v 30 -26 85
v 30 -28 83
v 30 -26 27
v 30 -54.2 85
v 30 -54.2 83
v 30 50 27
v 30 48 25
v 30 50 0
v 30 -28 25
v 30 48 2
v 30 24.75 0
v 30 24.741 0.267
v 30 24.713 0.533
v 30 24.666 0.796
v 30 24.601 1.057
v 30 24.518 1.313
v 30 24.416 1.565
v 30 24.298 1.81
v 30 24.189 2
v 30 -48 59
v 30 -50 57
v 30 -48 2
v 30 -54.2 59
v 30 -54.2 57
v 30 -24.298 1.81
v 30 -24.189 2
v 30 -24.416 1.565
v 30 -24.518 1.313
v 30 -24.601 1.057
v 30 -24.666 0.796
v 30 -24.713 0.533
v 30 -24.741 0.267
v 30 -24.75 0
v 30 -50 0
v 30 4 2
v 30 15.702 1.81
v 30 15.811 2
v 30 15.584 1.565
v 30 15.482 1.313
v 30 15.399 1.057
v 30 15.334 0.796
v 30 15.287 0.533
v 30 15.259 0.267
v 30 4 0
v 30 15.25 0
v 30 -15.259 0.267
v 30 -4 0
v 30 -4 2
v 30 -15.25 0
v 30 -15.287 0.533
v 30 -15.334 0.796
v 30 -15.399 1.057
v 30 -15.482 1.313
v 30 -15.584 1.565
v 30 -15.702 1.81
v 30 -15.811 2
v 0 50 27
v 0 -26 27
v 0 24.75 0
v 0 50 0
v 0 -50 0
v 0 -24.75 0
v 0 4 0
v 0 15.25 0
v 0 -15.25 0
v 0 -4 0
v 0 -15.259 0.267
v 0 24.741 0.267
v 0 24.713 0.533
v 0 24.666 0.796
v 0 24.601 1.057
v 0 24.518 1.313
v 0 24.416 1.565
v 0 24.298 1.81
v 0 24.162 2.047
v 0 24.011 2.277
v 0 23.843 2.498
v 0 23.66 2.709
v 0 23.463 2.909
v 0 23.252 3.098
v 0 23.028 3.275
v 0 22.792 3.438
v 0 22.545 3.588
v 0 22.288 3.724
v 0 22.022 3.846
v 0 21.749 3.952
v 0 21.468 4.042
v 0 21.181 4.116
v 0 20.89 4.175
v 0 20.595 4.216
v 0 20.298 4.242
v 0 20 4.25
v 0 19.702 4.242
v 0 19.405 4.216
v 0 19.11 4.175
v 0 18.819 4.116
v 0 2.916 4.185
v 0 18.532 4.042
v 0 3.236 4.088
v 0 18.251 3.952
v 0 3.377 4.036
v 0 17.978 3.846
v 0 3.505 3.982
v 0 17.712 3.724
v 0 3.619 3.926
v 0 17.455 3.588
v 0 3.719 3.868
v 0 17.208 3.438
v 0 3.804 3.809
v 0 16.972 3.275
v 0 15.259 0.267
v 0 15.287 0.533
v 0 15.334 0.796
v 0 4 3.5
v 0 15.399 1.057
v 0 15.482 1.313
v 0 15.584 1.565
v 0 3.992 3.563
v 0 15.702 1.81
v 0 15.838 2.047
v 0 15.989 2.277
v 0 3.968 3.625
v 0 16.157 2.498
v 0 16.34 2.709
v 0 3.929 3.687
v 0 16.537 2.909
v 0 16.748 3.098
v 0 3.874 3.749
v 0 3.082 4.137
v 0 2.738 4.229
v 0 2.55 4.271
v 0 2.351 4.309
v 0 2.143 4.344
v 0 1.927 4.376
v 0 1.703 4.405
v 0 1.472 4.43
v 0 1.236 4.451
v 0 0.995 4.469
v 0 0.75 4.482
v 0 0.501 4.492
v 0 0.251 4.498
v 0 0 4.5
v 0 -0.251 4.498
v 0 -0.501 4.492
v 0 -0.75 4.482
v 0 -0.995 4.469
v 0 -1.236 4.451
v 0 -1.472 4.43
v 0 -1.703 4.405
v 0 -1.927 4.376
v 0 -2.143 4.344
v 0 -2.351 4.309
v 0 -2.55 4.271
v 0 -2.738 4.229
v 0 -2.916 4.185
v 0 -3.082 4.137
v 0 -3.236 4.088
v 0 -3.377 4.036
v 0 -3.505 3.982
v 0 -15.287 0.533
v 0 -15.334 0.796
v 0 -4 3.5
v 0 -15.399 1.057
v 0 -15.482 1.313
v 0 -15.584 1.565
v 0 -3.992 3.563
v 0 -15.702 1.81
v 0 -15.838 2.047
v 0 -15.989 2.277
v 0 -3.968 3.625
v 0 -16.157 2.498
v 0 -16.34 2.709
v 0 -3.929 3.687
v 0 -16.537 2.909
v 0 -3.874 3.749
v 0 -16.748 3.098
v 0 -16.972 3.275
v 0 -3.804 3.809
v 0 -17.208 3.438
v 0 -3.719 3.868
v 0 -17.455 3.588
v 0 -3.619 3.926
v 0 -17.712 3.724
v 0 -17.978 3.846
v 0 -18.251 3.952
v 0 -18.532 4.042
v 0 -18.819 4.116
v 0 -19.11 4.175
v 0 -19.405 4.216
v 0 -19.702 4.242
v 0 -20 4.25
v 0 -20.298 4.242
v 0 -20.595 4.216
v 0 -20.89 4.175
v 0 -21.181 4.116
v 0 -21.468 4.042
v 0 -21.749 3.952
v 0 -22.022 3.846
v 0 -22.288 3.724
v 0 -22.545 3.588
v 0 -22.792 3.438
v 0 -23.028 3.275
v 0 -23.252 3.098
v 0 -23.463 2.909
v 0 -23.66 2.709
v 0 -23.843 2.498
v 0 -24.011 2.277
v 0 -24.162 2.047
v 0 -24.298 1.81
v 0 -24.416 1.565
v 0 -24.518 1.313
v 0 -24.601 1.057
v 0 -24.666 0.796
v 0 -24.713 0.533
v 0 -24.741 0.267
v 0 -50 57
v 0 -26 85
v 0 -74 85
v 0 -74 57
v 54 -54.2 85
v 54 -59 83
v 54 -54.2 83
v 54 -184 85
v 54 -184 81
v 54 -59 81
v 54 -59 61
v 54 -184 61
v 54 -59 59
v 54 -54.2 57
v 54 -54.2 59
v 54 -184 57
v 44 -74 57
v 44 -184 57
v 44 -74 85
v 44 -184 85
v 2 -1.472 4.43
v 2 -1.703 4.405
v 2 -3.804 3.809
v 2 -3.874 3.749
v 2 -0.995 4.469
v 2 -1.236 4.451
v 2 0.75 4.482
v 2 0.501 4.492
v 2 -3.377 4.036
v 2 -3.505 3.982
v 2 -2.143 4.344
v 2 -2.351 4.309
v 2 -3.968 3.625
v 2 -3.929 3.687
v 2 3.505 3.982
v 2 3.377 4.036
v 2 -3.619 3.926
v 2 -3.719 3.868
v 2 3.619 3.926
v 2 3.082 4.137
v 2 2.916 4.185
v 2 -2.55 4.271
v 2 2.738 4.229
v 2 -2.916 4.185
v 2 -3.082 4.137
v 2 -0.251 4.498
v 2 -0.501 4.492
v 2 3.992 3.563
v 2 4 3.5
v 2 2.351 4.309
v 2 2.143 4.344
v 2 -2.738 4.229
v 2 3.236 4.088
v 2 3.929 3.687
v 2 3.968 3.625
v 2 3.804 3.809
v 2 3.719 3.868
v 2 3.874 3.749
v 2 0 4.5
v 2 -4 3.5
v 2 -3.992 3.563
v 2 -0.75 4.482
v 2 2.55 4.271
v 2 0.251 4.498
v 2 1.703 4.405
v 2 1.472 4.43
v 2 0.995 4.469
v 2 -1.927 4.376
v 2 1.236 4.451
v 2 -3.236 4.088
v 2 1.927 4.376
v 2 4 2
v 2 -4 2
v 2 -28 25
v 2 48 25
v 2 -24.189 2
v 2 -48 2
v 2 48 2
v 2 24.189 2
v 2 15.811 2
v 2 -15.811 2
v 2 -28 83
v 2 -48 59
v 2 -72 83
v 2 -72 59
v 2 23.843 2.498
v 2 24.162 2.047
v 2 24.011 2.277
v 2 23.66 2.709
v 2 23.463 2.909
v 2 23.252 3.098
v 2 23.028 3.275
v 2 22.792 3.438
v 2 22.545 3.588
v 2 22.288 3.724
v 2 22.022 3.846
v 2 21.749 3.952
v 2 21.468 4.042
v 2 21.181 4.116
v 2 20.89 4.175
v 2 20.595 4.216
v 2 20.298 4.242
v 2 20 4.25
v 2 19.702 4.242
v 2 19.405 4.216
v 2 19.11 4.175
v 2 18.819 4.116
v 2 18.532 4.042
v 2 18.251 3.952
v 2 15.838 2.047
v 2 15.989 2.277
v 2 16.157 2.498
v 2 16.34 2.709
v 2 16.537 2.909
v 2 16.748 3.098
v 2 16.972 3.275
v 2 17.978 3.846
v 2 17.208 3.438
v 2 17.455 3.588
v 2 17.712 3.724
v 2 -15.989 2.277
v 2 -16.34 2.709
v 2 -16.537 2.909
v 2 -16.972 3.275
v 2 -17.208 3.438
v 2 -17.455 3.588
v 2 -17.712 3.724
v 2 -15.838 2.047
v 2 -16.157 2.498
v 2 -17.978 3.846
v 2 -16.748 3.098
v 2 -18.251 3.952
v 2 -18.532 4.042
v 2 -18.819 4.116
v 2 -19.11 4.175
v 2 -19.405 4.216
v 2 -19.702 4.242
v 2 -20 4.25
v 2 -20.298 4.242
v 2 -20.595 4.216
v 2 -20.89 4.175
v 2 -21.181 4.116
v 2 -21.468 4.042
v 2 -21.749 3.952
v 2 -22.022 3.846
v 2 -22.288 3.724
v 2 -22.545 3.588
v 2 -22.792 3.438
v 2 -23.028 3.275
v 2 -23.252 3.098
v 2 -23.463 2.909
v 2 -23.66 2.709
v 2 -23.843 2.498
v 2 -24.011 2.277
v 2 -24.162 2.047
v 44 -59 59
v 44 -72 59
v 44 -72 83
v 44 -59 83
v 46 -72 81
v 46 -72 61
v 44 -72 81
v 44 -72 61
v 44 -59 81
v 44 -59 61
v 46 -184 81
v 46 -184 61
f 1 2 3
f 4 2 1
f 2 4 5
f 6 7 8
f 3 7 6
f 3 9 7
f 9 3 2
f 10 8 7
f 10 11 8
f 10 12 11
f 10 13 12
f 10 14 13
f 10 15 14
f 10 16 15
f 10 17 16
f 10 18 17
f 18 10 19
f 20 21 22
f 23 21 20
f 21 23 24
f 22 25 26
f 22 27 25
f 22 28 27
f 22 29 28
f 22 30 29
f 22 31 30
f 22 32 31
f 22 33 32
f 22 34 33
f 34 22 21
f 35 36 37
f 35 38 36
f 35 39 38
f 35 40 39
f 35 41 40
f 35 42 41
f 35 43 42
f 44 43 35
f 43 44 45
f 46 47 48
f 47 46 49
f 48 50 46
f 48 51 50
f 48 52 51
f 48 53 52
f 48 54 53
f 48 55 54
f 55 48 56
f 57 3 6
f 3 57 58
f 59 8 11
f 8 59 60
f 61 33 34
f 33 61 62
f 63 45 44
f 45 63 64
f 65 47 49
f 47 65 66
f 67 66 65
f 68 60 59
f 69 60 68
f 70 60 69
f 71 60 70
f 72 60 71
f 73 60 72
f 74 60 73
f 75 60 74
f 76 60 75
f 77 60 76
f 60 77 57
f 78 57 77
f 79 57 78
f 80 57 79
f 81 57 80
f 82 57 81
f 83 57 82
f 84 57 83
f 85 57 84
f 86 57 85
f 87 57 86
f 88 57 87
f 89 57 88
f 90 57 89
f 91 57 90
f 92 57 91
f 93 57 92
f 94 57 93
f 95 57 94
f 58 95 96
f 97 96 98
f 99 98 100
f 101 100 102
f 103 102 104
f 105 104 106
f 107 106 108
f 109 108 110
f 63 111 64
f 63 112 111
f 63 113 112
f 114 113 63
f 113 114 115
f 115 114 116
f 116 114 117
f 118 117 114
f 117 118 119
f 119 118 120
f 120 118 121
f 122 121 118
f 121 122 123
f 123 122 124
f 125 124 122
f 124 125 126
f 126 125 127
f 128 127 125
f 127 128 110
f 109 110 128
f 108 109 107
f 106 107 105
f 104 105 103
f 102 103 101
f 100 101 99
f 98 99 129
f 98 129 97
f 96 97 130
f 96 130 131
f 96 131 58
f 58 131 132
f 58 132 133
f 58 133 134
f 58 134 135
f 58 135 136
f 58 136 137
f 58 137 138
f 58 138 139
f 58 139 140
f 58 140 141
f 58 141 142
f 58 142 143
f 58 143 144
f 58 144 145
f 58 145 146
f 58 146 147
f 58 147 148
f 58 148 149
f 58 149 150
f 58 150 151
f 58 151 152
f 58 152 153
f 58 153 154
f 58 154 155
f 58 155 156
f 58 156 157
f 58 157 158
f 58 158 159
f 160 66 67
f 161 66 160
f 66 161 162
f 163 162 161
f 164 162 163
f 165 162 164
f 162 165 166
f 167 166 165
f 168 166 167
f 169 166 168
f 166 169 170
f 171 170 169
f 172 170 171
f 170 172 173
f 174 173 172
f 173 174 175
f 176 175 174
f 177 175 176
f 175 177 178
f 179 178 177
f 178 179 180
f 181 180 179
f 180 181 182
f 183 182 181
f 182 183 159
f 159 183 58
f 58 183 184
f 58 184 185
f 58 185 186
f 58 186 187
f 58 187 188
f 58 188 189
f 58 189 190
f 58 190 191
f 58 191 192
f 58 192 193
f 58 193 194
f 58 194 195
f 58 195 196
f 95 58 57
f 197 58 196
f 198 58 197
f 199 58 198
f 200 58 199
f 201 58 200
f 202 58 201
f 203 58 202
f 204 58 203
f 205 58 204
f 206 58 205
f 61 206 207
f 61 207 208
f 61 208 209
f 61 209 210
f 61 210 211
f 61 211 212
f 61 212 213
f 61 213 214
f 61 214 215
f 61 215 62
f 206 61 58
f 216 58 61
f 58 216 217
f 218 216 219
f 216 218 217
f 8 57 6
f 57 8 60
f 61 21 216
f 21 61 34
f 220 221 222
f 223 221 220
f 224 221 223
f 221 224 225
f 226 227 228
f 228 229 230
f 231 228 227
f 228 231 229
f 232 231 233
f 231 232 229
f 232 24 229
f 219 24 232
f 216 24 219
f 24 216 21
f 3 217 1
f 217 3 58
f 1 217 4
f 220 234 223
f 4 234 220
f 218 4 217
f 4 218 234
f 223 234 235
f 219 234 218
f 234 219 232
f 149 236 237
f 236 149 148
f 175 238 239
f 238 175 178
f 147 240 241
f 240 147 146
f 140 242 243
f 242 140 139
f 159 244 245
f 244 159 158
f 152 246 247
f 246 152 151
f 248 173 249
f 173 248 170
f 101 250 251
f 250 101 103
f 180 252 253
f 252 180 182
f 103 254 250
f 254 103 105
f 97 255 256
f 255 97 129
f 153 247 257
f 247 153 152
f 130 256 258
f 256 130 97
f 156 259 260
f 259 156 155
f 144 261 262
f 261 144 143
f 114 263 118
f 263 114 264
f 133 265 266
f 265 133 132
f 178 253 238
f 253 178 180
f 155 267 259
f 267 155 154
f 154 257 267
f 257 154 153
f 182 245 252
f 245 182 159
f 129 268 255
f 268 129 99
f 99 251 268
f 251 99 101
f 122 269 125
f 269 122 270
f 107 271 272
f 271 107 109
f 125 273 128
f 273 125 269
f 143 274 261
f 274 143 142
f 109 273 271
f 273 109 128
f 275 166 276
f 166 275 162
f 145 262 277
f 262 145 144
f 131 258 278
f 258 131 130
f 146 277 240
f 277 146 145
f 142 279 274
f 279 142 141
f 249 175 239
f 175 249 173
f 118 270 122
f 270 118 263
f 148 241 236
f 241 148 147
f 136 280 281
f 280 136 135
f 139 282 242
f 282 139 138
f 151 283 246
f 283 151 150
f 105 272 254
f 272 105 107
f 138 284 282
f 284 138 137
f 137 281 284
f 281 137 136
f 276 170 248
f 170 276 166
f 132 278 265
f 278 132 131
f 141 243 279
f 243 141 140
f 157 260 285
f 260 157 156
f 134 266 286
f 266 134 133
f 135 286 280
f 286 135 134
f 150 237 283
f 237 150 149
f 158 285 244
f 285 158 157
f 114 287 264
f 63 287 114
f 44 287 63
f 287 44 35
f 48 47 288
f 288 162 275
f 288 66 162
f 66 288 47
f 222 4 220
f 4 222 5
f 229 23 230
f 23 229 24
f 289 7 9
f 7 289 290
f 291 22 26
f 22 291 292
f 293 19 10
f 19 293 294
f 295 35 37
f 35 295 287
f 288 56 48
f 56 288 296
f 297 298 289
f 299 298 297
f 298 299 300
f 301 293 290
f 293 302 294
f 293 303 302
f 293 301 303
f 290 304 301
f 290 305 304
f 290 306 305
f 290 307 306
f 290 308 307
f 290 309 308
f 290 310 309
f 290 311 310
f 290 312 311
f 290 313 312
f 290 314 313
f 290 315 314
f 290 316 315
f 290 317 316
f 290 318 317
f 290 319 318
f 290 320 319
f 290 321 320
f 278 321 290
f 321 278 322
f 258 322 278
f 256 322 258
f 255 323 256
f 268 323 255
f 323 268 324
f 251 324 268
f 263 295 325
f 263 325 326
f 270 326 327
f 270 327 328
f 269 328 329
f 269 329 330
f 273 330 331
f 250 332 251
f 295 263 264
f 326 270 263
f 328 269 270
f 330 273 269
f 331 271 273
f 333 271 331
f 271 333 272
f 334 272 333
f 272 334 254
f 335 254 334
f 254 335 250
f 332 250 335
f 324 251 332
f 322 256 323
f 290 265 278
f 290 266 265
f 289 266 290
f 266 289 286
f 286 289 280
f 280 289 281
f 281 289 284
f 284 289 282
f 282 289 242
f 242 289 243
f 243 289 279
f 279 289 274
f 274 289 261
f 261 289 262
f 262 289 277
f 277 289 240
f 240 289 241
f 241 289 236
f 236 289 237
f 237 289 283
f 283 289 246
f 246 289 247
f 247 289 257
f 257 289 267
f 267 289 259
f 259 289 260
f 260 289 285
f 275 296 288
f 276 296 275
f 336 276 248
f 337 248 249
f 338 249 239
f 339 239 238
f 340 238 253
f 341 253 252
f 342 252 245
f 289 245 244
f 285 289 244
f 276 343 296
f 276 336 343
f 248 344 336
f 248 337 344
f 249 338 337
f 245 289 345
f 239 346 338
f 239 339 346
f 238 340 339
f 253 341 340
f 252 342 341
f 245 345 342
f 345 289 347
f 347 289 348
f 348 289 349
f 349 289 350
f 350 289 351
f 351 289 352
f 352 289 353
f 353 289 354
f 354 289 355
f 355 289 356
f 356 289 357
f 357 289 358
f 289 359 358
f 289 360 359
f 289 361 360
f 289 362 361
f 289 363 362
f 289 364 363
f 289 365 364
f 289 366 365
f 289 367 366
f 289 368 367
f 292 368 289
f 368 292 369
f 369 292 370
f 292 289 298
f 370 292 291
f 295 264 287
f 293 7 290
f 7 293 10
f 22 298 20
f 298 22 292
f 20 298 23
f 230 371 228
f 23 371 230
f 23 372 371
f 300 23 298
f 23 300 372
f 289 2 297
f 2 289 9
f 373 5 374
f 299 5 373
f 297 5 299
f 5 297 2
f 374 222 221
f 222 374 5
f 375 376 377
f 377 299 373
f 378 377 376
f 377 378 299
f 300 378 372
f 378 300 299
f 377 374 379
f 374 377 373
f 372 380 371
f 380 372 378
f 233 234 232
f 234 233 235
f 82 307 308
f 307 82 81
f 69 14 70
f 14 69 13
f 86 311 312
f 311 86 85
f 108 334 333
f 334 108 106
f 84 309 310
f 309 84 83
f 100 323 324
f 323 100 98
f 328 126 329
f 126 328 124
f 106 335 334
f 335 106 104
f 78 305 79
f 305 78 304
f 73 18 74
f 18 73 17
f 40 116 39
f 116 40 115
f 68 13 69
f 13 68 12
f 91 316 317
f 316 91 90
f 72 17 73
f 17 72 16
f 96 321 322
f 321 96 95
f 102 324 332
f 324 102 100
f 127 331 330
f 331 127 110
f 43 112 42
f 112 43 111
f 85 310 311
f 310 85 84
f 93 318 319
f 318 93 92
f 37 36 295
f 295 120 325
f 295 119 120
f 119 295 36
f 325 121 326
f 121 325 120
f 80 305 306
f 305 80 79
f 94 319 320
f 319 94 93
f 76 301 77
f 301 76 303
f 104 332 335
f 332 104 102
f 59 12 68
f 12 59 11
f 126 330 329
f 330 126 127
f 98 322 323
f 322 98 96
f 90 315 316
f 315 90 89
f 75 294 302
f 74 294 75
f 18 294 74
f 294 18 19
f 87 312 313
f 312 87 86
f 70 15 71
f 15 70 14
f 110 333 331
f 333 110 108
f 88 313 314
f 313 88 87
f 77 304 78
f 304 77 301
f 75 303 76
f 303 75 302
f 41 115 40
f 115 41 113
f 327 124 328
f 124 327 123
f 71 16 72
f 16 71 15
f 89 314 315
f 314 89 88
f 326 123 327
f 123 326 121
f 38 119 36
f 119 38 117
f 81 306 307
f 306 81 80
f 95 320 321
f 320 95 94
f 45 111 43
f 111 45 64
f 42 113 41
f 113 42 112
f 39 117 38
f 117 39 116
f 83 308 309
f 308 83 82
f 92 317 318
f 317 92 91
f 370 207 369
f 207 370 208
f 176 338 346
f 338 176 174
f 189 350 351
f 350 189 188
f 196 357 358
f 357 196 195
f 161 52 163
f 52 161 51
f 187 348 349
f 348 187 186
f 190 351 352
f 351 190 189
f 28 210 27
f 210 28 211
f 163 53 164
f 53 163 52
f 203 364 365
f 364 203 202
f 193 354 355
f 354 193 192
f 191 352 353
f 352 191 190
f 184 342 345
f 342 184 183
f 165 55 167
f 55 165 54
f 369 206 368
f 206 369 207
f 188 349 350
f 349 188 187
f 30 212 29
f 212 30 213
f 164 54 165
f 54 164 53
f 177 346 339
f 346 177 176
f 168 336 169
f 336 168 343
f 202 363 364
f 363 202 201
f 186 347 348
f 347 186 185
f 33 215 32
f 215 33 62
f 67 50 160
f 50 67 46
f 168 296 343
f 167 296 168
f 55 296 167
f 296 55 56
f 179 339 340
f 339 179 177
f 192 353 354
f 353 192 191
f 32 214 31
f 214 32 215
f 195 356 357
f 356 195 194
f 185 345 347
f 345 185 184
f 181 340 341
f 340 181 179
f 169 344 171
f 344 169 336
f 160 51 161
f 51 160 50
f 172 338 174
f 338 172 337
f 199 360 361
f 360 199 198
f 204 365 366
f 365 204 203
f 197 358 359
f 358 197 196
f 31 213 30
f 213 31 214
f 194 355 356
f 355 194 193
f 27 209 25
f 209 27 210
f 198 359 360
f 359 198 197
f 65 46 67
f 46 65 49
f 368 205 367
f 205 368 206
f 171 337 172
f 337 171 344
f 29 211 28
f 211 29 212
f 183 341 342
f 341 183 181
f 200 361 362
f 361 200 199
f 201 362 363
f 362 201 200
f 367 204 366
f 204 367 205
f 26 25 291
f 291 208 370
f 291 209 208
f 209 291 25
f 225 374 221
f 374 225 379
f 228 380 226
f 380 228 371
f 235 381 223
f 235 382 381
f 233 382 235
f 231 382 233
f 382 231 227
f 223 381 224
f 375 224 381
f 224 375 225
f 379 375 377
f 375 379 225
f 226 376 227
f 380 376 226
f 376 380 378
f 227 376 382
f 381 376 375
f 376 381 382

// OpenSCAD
//
// ktFloor1
//
//

gap1 = 0.001;
gap2 = 0.002;

th = 2;

L = 200;
LANW = 9.5;
LANH = LANW-0.5*2;
ACW = 8;
ACH = 4.5;
ACR = 2;

W = 100;
H = 6;
D = 15;

wall();
mole();


module main()
{
difference()
{
    union()
    {
        translate([0, -W/2, 0]) cube([L, W, H]);
    }
    translate([-gap1, -W/2, 0]) rotate([11, 0, 0]) cube([L+gap2, W, H*3]);
    translate([L+gap1,  W/2, 0]) rotate([11, 0, 180]) cube([L+gap2, W, H*3]);
    
    
    
    //AC
    translate([0, -ACW/2, 0]) {
    #translate([0, ACW/2, ACH-ACR/2]) resize(newsize=[L, ACW, ACR]) rotate([0, 90, 0]) cylinder(h=1, r=1, $fn=100);
    #translate([0, 0, 0]) cube([L, ACW, ACH-ACR/2]);
    }
    //LAN1
    translate([0, -LANW/2+40/2, 0]) {
    #translate([0, LANW/2, 0]) resize(newsize=[L, LANW, LANH]) rotate([0, 90, 0]) cylinder(h=1, r=1, $fn=100);
    }
    //LAN2
    translate([0, -LANW/2-40/2, 0]) {
    #translate([0, LANW/2, 0]) resize(newsize=[L, LANW, LANH]) rotate([0, 90, 0]) cylinder(h=1, r=1, $fn=100);
    }
}
}



module wall()
{
LL = 30;
difference()
{
    union()
    {
        translate([0, -W/2, 0]) cube([LL, W, 57-30]);
        translate([0, -W/2, 0]) cube([LL+24, 20+th*2, 57]);
        translate([0, -W/2-20-4, 57]) cube([LL+24, 40+th*2+4, 20+th*2+th*2]);
    }
    translate([LL, -100.4/2, 0]) cube([24, 100.4, 100]);
    translate([LL, -4-100.4/2, 0]) cube([24, 4, 100]);

    translate([th, -W/2+th, th]) cube([LL+gap2, W-th*2, 57-th*2-30]);
    translate([th, -W/2+th, th]) cube([LL+24, 20, 57]);
    translate([th, -W/2-20+th-4, 57+th]) cube([LL+24, 40+4, 20+th*2]);
    translate([LL+24-10, -W/2-20+th-th-4, 57+th]) cube([10, 40, 20+th*2]);
    
    
    
    
    //AC
    translate([0, -ACW/2, 0]) {
    #translate([0, ACW/2, ACH-ACR/2]) resize(newsize=[LL, ACW, ACR]) rotate([0, 90, 0]) cylinder(h=1, r=1, $fn=100);
    #translate([0, 0, 0]) cube([LL, ACW, ACH-ACR/2]);
    }
    //LAN1
    translate([0, -LANW/2+40/2, 0]) {
    #translate([0, LANW/2, 0]) resize(newsize=[LL, LANW, LANH]) rotate([0, 90, 0]) cylinder(h=1, r=1, $fn=100);
    }
    //LAN2
    translate([0, -LANW/2-40/2, 0]) {
    #translate([0, LANW/2, 0]) resize(newsize=[LL, LANW, LANH]) rotate([0, 90, 0]) cylinder(h=1, r=1, $fn=100);
    }
}
}


module mole()
{
LL = 30;
difference()
{
    union()
    {
        translate([LL+24-10, -W/2-20+th-th-4-110, 57+th]) cube([10, 110+15, 20+th*2]);
        translate([LL+24-10, -W/2-20+th-th-4-110, 57+th-th]) cube([10, 110, 20+th*2+th*2]);
    }
    translate([LL+24-10+th, -W/2-20+th-th-4-110, 57+th+th]) cube([10, 110+15, 20+th*2-th*2]);
    translate([LL+24-10, -W/2-20+th-th-4+th, 57+th+th]) cube([10, 15-th, 20+th*2-th*2]);


}
}
